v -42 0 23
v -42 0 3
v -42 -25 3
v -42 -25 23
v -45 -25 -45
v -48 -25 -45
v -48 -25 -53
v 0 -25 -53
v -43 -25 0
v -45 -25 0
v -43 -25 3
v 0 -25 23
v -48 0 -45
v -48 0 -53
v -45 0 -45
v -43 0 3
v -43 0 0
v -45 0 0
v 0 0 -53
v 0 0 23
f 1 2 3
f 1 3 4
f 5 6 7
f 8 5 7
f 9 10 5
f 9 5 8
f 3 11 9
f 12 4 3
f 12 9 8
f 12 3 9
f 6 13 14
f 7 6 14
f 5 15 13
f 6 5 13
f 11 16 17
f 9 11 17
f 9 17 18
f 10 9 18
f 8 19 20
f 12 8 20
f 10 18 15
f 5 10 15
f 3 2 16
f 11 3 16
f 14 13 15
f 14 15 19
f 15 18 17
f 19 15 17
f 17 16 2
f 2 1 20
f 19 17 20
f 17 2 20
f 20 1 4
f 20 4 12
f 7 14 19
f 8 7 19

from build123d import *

# Parameters (mm, degrees)
F0_W     = 42
F0_H     = 20
F1_DEPTH = 25


with BuildPart() as f1:
    # F0 (on Front) → F1 (new body)
    with BuildSketch(Plane.XZ):
        Polygon((0, -45), (0, 0), (-43, 0), (-45, 0), (-45, -45), align=None)
        Polygon((-43, 0), (0, 0), (0, 3), (-42, 3), (-43, 3), align=None)
        with Locations((-21, 13)):
            Rectangle(F0_W, F0_H)
        Polygon((0, -53), (0, -45), (-45, -45), (-48, -45), (-48, -53), align=None)
    extrude(amount=F1_DEPTH)


solid = f1.part
